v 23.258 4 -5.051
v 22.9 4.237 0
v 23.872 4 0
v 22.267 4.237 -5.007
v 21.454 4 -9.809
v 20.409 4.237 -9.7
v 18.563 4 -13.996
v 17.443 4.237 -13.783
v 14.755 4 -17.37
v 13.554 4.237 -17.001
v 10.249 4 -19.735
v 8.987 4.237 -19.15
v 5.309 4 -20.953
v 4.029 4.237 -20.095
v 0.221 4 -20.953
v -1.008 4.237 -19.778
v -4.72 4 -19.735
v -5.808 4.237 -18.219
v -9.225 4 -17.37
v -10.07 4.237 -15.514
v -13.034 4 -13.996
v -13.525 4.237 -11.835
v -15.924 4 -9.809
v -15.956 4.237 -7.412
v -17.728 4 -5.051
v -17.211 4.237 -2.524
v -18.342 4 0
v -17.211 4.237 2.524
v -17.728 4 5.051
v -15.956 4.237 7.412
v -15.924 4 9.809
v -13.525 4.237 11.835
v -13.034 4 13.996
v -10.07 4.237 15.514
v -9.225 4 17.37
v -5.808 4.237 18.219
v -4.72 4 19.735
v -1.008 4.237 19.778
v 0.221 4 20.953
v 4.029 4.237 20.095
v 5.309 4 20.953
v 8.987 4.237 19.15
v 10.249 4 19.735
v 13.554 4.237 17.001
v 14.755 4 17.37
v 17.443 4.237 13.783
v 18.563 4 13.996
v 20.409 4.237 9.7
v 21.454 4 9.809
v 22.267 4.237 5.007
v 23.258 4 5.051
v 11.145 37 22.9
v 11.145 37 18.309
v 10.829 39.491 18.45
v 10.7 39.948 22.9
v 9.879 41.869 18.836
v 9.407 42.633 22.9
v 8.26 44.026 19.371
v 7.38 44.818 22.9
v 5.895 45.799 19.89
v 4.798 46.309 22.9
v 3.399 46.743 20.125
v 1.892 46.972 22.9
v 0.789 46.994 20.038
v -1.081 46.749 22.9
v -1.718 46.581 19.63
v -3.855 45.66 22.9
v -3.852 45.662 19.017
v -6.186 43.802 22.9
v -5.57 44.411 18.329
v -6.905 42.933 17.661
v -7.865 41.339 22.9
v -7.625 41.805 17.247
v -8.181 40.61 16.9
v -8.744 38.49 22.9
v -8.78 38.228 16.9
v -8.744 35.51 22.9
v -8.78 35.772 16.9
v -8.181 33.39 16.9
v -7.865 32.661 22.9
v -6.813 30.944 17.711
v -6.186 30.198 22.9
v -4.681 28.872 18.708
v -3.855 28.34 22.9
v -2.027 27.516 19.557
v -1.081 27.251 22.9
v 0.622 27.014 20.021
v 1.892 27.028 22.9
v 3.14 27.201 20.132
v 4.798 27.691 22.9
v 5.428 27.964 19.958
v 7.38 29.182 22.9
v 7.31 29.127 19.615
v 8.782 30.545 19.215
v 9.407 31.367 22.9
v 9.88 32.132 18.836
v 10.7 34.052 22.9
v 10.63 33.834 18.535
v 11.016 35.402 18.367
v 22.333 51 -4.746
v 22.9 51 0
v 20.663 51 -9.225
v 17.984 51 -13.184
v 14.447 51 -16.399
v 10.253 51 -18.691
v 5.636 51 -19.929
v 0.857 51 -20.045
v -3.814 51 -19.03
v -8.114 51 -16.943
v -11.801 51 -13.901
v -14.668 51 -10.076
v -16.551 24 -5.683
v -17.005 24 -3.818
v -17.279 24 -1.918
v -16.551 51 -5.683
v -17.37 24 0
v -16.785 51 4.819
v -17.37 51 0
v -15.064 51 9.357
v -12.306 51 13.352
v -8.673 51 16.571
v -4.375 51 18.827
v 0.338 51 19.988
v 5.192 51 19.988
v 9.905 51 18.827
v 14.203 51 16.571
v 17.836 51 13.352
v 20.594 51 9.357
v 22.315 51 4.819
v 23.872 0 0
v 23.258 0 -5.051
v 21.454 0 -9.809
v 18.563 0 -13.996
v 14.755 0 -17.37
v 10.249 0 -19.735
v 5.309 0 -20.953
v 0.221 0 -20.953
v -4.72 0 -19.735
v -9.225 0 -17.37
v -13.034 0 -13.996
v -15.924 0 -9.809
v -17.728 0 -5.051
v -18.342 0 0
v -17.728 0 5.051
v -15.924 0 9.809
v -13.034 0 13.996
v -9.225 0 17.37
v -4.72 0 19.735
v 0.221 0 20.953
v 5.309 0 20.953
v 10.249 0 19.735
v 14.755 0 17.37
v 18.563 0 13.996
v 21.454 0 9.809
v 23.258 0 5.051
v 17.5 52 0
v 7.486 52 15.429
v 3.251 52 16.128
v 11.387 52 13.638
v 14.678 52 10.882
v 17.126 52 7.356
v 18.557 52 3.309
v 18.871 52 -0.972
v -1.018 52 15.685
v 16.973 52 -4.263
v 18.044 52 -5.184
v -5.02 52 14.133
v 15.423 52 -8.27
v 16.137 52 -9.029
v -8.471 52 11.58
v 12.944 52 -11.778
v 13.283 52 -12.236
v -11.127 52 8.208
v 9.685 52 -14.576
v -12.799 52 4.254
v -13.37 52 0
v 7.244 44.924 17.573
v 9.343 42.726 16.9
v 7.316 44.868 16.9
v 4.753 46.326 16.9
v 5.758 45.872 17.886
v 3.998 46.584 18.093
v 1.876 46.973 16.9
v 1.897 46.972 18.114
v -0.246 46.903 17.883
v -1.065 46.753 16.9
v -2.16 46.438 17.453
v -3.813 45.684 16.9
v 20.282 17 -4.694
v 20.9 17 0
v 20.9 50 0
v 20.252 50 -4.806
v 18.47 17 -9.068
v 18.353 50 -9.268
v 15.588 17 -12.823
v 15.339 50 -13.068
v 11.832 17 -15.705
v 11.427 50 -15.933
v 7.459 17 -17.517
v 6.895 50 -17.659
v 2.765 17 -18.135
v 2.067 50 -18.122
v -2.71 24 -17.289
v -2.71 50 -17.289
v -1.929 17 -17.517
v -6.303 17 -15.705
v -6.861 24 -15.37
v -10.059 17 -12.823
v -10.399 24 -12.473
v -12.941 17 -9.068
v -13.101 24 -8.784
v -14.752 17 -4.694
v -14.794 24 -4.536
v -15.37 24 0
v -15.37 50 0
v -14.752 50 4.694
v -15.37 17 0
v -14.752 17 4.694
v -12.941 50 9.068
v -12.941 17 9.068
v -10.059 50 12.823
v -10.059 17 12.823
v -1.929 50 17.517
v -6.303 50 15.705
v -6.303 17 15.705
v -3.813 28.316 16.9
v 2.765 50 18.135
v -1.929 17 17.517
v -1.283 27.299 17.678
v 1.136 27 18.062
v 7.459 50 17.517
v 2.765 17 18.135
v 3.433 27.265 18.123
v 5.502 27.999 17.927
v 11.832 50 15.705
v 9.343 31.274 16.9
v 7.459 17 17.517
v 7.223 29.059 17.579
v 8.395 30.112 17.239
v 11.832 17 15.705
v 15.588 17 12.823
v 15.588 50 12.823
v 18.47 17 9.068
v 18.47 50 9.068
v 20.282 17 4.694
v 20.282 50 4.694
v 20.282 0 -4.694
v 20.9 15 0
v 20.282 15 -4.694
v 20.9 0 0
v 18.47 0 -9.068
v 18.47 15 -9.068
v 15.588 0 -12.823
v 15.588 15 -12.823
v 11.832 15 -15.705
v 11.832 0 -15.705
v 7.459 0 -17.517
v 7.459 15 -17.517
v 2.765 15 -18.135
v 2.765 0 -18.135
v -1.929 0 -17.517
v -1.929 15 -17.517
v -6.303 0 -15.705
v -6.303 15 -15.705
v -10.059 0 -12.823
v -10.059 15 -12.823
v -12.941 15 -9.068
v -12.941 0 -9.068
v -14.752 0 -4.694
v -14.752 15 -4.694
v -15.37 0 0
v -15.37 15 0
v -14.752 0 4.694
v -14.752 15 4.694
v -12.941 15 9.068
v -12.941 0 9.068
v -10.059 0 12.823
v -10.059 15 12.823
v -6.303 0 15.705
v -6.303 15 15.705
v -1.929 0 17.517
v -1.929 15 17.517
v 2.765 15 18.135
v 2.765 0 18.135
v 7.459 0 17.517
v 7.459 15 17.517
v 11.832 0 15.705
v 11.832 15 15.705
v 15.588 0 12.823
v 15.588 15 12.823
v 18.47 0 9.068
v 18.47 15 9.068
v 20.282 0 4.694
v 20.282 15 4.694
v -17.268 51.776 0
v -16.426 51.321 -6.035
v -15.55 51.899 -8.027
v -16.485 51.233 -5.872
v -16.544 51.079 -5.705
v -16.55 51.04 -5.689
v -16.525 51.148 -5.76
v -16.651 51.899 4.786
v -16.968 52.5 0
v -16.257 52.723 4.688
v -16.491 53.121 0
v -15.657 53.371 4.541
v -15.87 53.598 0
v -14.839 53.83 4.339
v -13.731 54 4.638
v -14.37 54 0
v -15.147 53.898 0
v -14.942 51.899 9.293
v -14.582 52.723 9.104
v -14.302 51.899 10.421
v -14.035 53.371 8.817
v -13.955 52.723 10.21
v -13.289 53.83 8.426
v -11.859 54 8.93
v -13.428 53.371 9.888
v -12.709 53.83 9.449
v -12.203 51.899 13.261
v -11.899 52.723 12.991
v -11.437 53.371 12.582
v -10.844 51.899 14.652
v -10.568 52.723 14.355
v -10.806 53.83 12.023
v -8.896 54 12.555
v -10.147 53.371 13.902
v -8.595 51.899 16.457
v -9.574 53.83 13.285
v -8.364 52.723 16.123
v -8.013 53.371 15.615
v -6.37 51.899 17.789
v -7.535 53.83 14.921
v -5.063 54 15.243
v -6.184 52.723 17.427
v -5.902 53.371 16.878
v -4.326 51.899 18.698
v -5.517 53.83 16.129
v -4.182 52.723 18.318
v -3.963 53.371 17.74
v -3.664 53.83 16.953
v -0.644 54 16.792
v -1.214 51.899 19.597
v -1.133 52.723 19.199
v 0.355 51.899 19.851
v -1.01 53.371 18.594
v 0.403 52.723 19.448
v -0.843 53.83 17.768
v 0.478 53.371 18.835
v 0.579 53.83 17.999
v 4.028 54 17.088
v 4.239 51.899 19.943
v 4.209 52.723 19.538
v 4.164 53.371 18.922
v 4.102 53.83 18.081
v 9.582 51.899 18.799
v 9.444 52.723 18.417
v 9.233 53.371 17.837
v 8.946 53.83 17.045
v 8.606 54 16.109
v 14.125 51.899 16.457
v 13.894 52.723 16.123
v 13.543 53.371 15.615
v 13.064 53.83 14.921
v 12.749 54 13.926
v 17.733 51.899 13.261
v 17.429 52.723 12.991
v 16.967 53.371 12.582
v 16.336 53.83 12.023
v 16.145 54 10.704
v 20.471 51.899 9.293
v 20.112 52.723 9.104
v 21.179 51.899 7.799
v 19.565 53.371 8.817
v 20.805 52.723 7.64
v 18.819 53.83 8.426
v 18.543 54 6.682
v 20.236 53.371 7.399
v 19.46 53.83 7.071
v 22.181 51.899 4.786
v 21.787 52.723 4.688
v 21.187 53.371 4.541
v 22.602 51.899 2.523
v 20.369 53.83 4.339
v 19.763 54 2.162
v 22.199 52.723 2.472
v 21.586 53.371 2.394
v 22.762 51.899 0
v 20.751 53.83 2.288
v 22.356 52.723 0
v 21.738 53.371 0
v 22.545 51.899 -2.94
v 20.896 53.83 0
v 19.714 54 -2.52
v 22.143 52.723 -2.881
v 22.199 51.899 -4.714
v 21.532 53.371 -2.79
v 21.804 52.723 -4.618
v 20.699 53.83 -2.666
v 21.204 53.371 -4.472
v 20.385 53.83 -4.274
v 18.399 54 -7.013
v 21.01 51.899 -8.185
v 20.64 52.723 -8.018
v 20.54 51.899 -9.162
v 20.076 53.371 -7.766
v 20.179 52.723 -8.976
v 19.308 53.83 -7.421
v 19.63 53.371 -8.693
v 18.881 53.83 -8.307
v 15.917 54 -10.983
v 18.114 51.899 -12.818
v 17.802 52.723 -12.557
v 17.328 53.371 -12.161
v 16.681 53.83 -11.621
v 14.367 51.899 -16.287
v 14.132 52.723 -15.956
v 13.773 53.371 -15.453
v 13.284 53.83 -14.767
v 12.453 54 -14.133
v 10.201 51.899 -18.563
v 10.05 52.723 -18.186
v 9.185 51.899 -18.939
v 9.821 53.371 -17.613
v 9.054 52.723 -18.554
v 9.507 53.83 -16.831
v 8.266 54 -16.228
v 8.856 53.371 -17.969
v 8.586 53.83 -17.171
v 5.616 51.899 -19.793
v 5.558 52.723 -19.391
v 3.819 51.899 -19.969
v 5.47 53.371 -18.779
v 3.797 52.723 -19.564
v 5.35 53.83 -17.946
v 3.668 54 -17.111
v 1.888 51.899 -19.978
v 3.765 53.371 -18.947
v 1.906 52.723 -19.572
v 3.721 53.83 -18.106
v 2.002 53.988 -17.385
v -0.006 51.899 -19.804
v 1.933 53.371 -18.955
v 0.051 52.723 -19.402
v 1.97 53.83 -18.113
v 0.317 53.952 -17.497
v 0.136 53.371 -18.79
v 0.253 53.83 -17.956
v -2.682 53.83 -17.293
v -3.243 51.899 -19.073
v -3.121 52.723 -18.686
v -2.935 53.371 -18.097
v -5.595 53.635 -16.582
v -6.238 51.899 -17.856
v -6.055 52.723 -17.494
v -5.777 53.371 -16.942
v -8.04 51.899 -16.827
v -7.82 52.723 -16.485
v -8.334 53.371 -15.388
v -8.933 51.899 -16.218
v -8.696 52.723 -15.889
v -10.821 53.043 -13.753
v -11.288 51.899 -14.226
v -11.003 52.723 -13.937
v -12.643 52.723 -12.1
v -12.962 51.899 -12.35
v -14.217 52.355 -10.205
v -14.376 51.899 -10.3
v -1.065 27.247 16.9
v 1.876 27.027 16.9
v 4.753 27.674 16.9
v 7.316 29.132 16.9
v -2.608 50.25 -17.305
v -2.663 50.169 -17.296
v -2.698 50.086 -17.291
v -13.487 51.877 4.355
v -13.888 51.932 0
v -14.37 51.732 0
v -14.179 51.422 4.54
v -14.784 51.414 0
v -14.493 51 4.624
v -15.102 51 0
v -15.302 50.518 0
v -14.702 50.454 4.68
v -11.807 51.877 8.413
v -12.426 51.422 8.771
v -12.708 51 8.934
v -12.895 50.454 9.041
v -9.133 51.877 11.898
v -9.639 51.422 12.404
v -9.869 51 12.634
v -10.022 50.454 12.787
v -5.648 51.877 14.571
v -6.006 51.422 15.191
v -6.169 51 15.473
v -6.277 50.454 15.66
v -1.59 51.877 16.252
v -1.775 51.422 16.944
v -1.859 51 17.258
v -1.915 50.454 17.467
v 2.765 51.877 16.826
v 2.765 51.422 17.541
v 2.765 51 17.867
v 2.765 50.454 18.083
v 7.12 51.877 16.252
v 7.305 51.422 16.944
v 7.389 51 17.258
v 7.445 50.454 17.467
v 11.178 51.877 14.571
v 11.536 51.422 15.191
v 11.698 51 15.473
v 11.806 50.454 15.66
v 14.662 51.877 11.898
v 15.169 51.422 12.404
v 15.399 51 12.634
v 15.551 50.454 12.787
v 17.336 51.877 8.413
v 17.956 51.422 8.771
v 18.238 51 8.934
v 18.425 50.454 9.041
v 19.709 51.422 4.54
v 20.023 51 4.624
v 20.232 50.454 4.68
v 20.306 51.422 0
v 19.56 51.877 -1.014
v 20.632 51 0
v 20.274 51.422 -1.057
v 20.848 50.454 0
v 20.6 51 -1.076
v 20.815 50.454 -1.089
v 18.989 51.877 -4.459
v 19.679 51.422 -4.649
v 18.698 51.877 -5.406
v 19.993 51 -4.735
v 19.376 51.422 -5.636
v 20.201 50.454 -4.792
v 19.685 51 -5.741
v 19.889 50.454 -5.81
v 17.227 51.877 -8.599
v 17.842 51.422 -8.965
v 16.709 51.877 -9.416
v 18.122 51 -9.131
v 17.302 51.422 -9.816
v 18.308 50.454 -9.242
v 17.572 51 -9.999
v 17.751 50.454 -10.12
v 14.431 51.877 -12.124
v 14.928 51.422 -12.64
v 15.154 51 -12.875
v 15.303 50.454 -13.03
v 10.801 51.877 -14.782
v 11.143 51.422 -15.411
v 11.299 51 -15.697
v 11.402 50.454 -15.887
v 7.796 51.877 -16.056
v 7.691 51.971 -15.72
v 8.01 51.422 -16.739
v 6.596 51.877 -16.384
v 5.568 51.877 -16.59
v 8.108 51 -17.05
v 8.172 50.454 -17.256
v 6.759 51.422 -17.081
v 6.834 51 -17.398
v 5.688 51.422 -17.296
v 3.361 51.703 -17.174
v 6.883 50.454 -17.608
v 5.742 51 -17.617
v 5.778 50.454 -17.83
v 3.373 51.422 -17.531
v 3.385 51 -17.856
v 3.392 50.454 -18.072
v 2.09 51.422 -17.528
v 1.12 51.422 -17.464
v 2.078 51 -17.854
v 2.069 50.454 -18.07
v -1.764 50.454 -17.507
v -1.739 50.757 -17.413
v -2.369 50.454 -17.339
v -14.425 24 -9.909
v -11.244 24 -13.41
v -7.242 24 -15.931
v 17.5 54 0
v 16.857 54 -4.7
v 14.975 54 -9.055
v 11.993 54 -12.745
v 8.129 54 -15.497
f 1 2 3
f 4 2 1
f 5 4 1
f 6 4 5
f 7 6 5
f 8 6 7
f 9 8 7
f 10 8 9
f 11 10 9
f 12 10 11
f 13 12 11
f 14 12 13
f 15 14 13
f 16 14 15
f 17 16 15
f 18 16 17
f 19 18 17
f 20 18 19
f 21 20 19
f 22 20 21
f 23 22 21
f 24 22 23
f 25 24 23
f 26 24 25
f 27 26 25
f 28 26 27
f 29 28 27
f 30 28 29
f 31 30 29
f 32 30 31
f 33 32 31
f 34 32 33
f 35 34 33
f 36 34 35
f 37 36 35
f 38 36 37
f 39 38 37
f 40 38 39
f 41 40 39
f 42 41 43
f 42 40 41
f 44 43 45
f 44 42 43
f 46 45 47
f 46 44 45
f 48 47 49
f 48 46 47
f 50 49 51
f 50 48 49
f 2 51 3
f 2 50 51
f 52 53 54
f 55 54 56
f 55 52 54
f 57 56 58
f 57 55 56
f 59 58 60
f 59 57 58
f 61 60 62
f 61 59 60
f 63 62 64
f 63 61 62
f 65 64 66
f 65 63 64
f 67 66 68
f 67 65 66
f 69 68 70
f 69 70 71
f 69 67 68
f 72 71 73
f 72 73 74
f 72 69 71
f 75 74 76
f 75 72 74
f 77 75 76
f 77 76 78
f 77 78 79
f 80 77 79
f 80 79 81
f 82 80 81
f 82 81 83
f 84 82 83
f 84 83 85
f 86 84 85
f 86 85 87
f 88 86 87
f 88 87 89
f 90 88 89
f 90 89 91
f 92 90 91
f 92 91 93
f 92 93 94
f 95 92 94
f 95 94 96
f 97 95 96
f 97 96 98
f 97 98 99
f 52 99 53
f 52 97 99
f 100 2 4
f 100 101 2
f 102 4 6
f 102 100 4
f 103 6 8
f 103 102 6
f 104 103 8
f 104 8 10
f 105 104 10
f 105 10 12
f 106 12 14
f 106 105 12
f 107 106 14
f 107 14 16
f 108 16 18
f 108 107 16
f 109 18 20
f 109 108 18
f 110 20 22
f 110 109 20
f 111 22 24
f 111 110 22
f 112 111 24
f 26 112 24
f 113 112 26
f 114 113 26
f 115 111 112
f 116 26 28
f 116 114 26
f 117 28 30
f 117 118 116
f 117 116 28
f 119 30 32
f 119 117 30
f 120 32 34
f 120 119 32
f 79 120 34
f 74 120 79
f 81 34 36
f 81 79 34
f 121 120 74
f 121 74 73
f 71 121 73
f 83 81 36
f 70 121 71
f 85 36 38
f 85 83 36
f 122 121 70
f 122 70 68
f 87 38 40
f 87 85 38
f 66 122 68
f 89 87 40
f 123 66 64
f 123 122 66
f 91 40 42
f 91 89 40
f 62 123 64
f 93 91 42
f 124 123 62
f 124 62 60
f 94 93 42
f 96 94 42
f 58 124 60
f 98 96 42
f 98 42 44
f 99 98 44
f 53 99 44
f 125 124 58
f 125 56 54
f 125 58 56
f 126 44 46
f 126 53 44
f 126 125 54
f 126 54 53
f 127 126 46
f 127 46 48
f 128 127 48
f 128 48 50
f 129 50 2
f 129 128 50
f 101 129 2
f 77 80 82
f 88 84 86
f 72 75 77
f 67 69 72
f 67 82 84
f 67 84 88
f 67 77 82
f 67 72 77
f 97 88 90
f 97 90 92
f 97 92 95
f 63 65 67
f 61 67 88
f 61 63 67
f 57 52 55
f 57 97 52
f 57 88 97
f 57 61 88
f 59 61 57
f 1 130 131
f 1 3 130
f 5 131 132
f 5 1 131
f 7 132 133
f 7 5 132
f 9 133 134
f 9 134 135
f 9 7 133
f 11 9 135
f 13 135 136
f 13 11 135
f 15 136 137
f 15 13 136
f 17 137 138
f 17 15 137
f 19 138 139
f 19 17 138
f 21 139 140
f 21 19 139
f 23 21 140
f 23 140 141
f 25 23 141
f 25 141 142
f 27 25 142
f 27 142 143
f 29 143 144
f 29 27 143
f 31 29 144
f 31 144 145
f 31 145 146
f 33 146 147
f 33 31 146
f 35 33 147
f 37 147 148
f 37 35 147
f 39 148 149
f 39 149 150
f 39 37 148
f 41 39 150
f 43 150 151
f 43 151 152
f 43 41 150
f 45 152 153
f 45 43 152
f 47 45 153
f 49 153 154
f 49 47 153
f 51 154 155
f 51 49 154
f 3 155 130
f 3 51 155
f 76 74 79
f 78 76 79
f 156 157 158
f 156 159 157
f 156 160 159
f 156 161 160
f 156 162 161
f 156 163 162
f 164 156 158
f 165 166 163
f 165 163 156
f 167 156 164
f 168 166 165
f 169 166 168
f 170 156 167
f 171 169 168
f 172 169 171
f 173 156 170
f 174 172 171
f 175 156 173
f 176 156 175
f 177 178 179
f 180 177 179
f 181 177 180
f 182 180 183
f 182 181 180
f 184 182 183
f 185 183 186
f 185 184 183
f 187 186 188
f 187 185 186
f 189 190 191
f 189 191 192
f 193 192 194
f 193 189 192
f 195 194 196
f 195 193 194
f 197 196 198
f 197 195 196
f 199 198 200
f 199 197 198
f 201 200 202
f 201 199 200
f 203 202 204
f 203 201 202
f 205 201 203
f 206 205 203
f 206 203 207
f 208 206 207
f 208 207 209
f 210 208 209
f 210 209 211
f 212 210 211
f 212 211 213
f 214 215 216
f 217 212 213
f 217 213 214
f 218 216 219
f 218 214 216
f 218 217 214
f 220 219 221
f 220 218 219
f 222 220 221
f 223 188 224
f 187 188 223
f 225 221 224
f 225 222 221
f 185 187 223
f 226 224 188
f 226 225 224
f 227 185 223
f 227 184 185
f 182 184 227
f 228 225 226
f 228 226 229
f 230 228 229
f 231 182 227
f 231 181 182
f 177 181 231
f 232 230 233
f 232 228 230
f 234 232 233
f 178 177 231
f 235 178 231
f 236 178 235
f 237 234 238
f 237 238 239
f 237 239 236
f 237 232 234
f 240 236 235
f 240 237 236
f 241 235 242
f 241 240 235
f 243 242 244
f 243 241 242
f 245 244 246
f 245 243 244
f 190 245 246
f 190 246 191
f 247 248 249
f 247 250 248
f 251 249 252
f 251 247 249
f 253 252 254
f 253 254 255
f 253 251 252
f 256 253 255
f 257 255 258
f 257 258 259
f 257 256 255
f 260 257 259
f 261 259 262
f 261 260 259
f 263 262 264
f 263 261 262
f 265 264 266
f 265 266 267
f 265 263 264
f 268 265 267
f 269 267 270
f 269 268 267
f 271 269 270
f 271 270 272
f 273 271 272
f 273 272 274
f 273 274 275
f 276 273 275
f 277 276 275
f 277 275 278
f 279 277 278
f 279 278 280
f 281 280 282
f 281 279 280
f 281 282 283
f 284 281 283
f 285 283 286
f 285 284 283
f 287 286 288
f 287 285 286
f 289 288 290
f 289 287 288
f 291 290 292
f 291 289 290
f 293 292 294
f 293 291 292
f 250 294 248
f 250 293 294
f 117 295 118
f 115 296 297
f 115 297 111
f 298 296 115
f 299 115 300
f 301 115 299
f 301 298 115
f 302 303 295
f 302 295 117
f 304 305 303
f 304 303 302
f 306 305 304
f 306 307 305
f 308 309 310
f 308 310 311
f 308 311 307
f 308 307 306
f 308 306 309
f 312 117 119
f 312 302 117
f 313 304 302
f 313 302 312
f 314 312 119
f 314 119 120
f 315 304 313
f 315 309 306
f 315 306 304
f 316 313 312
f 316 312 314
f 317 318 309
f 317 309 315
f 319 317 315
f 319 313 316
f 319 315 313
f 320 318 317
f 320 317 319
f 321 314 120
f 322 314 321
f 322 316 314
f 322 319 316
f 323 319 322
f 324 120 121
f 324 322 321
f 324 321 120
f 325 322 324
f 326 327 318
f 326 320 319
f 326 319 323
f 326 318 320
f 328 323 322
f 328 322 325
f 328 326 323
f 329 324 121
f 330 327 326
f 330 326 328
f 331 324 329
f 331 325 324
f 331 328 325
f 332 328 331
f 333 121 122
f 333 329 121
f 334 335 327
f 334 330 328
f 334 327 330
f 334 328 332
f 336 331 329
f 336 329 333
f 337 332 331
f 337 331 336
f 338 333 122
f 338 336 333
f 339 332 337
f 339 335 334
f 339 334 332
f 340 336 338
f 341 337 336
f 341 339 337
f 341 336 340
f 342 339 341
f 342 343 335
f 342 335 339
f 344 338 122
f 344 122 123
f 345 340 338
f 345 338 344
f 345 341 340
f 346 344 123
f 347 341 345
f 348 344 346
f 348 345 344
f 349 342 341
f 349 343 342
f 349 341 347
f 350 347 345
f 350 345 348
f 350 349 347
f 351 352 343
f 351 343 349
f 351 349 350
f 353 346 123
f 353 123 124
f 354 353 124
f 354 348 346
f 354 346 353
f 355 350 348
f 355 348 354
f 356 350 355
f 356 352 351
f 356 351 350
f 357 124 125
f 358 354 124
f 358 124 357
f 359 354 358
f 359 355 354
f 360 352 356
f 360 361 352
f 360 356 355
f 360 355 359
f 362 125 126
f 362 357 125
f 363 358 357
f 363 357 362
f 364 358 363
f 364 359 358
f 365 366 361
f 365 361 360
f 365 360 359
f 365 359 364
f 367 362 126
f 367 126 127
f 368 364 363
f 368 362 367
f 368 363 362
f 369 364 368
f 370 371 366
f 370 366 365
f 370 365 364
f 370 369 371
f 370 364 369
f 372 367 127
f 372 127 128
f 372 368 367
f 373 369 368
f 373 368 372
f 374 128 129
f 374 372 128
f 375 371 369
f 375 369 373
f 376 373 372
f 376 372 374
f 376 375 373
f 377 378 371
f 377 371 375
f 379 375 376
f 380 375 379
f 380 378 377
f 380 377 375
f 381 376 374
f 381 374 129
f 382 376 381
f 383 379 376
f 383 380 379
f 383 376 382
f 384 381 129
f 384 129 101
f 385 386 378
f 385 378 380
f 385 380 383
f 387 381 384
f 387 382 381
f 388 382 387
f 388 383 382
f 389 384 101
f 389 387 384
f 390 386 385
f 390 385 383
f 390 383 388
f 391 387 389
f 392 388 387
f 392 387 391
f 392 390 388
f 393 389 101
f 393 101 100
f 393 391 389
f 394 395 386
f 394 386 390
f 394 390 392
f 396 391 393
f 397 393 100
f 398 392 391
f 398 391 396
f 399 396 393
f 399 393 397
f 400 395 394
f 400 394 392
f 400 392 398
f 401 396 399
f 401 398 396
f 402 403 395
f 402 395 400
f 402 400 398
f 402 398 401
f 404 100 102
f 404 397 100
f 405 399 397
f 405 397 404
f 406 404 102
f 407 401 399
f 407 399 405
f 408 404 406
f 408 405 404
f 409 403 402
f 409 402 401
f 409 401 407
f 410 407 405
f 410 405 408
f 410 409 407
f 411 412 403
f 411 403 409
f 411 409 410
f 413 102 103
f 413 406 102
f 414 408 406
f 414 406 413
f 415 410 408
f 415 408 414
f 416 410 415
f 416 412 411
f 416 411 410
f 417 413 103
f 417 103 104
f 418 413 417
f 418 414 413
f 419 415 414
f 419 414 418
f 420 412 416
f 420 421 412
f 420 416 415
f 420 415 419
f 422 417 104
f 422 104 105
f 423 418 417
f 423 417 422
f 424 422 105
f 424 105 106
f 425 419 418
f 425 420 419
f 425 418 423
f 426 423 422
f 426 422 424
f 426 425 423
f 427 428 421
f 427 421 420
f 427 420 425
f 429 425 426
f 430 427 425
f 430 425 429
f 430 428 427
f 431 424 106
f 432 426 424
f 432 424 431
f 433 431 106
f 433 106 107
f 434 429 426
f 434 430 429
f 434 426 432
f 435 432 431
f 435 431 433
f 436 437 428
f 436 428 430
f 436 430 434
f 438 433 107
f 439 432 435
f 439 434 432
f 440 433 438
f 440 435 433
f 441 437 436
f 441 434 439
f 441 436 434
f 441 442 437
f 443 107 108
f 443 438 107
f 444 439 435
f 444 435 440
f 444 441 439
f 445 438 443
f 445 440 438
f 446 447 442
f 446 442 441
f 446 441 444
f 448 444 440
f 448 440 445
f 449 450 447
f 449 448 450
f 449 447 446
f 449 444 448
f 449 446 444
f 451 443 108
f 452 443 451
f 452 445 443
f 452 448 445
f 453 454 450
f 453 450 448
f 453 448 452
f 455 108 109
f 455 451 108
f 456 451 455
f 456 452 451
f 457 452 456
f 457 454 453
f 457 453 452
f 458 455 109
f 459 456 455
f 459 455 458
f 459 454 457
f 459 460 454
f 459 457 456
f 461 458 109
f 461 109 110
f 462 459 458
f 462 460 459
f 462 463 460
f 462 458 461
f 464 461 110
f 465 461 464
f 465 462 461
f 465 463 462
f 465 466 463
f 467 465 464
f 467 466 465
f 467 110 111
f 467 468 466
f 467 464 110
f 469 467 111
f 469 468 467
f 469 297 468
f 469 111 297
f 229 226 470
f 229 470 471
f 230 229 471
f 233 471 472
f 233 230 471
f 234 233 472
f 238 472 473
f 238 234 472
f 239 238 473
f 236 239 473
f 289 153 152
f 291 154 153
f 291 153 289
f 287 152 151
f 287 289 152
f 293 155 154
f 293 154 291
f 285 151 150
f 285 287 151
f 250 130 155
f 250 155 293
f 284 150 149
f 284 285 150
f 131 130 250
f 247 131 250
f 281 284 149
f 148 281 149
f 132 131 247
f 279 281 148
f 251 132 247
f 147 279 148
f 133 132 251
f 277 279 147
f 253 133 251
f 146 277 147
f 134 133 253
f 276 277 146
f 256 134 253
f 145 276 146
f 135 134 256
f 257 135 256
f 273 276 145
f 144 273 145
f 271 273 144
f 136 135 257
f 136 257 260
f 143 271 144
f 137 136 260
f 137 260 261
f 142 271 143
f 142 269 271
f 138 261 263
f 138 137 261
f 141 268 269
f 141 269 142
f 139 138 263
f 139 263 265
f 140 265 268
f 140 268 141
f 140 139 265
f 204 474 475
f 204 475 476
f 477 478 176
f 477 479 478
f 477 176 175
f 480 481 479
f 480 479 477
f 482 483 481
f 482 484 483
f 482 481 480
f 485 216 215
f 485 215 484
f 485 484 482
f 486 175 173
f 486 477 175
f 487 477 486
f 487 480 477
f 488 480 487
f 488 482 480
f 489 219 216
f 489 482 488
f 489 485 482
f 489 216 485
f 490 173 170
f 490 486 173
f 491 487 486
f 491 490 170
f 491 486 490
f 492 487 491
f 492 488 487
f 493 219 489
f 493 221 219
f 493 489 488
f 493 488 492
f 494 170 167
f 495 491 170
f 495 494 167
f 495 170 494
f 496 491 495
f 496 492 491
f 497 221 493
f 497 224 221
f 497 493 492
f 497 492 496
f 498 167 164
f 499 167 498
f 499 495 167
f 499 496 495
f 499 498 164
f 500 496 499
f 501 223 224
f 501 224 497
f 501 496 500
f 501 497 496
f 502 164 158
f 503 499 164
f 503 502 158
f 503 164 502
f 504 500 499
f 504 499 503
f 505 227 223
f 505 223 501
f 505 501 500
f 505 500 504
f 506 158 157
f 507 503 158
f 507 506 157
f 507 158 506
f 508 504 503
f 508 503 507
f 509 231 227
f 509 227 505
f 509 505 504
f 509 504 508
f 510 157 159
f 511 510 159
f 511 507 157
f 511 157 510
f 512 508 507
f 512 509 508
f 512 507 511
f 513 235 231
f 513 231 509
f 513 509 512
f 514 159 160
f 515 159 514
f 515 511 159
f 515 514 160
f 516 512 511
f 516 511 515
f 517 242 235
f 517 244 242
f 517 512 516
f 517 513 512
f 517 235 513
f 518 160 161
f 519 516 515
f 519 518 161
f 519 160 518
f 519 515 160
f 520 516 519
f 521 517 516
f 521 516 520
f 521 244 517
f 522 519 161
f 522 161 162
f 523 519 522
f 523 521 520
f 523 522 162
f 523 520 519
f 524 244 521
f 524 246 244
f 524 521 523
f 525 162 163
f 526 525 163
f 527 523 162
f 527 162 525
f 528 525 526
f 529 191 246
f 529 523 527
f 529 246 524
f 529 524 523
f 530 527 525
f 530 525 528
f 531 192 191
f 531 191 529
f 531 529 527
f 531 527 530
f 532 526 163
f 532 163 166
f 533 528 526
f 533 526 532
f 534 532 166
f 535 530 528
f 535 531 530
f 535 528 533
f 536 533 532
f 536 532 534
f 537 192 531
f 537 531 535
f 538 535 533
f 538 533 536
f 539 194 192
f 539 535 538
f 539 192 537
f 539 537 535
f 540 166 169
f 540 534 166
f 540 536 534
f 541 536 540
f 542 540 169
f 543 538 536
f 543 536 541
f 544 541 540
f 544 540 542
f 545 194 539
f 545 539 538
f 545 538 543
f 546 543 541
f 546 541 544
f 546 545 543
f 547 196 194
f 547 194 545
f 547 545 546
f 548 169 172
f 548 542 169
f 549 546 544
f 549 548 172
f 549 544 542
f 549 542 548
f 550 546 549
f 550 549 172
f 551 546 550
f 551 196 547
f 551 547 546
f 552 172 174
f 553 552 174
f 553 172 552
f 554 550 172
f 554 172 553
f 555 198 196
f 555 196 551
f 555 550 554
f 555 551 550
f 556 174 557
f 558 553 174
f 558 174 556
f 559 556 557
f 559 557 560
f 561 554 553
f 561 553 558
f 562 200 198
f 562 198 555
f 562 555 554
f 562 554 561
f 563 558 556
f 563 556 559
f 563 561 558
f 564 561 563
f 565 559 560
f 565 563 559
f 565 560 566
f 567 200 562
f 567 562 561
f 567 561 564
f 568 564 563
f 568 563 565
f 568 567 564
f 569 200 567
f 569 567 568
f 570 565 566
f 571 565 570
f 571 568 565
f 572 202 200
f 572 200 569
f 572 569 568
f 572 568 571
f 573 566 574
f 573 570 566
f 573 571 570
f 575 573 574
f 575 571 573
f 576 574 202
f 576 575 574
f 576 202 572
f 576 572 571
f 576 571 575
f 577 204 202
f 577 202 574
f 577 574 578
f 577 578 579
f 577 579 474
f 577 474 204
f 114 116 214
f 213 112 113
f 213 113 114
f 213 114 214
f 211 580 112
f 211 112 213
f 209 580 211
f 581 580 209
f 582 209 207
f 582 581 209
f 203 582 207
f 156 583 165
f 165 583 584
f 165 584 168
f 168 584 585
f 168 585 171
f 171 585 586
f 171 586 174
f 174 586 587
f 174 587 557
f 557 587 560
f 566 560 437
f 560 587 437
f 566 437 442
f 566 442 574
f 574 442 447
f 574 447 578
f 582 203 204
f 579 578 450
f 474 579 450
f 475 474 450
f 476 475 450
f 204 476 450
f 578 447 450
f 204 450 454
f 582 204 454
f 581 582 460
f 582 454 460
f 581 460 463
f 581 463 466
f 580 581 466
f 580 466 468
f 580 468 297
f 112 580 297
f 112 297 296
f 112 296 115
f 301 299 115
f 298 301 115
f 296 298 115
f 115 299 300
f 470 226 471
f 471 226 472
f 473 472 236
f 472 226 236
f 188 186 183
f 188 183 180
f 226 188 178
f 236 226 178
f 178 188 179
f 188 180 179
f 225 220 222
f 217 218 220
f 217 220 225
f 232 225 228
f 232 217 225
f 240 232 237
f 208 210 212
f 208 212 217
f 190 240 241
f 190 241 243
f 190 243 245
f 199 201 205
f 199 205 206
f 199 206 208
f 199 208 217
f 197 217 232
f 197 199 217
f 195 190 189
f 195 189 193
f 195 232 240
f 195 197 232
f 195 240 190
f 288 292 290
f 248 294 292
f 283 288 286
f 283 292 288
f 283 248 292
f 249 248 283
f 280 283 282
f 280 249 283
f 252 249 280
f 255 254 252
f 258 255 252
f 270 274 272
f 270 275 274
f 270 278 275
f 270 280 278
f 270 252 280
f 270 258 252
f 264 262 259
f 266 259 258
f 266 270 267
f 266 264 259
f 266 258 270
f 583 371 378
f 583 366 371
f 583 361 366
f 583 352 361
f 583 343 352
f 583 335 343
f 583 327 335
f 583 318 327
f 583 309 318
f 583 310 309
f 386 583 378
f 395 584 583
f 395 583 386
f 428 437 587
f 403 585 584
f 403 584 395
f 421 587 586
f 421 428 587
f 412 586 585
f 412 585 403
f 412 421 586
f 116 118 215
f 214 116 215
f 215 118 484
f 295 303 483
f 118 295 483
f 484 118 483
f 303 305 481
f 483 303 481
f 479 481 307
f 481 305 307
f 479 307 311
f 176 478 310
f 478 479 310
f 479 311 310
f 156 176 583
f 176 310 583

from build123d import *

# Parameters (mm, degrees)
SKETCH4_R           = 10
BOSS_EXTRUDE2_DEPTH = 6
CUT_EXTRUDE2_DEPTH  = 30


with BuildPart() as part:
    # Sketch1 → Revolve1 (revolve)
    with BuildSketch(Plane.XY):
        with BuildLine():
            Line((20.9, 0), (23.871591838, 0))
            Line((23.871591838, 0), (23.871591838, 4))
            Line((23.871591838, 4), (22.9, 4.236662843))
            Line((22.9, 4.236662843), (22.9, 51))
            ThreePointArc((22.9, 51), (22.021320344, 53.121320344), (19.9, 54))
            Line((19.9, 54), (2.764914955, 54))
            Line((2.764914955, 54), (2.764914955, 52))
            Line((2.764914955, 52), (18.9, 52))
            ThreePointArc((18.9, 52), (20.314213562, 51.414213562), (20.9, 50))
            Line((20.9, 50), (20.9, 17))
            Line((20.9, 17), (2.764914955, 17))
            Line((2.764914955, 17), (2.764914955, 15))
            Line((2.764914955, 15), (20.9, 15))
            Line((20.9, 15), (20.9, 0))
        make_face()
    revolve(axis=Axis((2.764914955, 7.821821657, 0), (0, 1, 0)))

    # Sketch4 → Boss-Extrude2 (add)
    with BuildSketch(Plane.XY.offset(22.9)):
        with Locations((1.144629865, 37)):
            Circle(SKETCH4_R)
    extrude(amount=-BOSS_EXTRUDE2_DEPTH)

    # Sketch9 → Cut-Extrude2 (cut)
    with BuildSketch(Plane(origin=(0, 54, 0), x_dir=(1, 0, 0), z_dir=(0, 1, 0))):
        with BuildLine():
            Line((-17.5, 0), (17.5, 0))
            ThreePointArc((17.5, 0), (0, 17.5), (-17.5, 0))
        make_face()
    extrude(amount=-CUT_EXTRUDE2_DEPTH, mode=Mode.SUBTRACT)


solid = part.part
